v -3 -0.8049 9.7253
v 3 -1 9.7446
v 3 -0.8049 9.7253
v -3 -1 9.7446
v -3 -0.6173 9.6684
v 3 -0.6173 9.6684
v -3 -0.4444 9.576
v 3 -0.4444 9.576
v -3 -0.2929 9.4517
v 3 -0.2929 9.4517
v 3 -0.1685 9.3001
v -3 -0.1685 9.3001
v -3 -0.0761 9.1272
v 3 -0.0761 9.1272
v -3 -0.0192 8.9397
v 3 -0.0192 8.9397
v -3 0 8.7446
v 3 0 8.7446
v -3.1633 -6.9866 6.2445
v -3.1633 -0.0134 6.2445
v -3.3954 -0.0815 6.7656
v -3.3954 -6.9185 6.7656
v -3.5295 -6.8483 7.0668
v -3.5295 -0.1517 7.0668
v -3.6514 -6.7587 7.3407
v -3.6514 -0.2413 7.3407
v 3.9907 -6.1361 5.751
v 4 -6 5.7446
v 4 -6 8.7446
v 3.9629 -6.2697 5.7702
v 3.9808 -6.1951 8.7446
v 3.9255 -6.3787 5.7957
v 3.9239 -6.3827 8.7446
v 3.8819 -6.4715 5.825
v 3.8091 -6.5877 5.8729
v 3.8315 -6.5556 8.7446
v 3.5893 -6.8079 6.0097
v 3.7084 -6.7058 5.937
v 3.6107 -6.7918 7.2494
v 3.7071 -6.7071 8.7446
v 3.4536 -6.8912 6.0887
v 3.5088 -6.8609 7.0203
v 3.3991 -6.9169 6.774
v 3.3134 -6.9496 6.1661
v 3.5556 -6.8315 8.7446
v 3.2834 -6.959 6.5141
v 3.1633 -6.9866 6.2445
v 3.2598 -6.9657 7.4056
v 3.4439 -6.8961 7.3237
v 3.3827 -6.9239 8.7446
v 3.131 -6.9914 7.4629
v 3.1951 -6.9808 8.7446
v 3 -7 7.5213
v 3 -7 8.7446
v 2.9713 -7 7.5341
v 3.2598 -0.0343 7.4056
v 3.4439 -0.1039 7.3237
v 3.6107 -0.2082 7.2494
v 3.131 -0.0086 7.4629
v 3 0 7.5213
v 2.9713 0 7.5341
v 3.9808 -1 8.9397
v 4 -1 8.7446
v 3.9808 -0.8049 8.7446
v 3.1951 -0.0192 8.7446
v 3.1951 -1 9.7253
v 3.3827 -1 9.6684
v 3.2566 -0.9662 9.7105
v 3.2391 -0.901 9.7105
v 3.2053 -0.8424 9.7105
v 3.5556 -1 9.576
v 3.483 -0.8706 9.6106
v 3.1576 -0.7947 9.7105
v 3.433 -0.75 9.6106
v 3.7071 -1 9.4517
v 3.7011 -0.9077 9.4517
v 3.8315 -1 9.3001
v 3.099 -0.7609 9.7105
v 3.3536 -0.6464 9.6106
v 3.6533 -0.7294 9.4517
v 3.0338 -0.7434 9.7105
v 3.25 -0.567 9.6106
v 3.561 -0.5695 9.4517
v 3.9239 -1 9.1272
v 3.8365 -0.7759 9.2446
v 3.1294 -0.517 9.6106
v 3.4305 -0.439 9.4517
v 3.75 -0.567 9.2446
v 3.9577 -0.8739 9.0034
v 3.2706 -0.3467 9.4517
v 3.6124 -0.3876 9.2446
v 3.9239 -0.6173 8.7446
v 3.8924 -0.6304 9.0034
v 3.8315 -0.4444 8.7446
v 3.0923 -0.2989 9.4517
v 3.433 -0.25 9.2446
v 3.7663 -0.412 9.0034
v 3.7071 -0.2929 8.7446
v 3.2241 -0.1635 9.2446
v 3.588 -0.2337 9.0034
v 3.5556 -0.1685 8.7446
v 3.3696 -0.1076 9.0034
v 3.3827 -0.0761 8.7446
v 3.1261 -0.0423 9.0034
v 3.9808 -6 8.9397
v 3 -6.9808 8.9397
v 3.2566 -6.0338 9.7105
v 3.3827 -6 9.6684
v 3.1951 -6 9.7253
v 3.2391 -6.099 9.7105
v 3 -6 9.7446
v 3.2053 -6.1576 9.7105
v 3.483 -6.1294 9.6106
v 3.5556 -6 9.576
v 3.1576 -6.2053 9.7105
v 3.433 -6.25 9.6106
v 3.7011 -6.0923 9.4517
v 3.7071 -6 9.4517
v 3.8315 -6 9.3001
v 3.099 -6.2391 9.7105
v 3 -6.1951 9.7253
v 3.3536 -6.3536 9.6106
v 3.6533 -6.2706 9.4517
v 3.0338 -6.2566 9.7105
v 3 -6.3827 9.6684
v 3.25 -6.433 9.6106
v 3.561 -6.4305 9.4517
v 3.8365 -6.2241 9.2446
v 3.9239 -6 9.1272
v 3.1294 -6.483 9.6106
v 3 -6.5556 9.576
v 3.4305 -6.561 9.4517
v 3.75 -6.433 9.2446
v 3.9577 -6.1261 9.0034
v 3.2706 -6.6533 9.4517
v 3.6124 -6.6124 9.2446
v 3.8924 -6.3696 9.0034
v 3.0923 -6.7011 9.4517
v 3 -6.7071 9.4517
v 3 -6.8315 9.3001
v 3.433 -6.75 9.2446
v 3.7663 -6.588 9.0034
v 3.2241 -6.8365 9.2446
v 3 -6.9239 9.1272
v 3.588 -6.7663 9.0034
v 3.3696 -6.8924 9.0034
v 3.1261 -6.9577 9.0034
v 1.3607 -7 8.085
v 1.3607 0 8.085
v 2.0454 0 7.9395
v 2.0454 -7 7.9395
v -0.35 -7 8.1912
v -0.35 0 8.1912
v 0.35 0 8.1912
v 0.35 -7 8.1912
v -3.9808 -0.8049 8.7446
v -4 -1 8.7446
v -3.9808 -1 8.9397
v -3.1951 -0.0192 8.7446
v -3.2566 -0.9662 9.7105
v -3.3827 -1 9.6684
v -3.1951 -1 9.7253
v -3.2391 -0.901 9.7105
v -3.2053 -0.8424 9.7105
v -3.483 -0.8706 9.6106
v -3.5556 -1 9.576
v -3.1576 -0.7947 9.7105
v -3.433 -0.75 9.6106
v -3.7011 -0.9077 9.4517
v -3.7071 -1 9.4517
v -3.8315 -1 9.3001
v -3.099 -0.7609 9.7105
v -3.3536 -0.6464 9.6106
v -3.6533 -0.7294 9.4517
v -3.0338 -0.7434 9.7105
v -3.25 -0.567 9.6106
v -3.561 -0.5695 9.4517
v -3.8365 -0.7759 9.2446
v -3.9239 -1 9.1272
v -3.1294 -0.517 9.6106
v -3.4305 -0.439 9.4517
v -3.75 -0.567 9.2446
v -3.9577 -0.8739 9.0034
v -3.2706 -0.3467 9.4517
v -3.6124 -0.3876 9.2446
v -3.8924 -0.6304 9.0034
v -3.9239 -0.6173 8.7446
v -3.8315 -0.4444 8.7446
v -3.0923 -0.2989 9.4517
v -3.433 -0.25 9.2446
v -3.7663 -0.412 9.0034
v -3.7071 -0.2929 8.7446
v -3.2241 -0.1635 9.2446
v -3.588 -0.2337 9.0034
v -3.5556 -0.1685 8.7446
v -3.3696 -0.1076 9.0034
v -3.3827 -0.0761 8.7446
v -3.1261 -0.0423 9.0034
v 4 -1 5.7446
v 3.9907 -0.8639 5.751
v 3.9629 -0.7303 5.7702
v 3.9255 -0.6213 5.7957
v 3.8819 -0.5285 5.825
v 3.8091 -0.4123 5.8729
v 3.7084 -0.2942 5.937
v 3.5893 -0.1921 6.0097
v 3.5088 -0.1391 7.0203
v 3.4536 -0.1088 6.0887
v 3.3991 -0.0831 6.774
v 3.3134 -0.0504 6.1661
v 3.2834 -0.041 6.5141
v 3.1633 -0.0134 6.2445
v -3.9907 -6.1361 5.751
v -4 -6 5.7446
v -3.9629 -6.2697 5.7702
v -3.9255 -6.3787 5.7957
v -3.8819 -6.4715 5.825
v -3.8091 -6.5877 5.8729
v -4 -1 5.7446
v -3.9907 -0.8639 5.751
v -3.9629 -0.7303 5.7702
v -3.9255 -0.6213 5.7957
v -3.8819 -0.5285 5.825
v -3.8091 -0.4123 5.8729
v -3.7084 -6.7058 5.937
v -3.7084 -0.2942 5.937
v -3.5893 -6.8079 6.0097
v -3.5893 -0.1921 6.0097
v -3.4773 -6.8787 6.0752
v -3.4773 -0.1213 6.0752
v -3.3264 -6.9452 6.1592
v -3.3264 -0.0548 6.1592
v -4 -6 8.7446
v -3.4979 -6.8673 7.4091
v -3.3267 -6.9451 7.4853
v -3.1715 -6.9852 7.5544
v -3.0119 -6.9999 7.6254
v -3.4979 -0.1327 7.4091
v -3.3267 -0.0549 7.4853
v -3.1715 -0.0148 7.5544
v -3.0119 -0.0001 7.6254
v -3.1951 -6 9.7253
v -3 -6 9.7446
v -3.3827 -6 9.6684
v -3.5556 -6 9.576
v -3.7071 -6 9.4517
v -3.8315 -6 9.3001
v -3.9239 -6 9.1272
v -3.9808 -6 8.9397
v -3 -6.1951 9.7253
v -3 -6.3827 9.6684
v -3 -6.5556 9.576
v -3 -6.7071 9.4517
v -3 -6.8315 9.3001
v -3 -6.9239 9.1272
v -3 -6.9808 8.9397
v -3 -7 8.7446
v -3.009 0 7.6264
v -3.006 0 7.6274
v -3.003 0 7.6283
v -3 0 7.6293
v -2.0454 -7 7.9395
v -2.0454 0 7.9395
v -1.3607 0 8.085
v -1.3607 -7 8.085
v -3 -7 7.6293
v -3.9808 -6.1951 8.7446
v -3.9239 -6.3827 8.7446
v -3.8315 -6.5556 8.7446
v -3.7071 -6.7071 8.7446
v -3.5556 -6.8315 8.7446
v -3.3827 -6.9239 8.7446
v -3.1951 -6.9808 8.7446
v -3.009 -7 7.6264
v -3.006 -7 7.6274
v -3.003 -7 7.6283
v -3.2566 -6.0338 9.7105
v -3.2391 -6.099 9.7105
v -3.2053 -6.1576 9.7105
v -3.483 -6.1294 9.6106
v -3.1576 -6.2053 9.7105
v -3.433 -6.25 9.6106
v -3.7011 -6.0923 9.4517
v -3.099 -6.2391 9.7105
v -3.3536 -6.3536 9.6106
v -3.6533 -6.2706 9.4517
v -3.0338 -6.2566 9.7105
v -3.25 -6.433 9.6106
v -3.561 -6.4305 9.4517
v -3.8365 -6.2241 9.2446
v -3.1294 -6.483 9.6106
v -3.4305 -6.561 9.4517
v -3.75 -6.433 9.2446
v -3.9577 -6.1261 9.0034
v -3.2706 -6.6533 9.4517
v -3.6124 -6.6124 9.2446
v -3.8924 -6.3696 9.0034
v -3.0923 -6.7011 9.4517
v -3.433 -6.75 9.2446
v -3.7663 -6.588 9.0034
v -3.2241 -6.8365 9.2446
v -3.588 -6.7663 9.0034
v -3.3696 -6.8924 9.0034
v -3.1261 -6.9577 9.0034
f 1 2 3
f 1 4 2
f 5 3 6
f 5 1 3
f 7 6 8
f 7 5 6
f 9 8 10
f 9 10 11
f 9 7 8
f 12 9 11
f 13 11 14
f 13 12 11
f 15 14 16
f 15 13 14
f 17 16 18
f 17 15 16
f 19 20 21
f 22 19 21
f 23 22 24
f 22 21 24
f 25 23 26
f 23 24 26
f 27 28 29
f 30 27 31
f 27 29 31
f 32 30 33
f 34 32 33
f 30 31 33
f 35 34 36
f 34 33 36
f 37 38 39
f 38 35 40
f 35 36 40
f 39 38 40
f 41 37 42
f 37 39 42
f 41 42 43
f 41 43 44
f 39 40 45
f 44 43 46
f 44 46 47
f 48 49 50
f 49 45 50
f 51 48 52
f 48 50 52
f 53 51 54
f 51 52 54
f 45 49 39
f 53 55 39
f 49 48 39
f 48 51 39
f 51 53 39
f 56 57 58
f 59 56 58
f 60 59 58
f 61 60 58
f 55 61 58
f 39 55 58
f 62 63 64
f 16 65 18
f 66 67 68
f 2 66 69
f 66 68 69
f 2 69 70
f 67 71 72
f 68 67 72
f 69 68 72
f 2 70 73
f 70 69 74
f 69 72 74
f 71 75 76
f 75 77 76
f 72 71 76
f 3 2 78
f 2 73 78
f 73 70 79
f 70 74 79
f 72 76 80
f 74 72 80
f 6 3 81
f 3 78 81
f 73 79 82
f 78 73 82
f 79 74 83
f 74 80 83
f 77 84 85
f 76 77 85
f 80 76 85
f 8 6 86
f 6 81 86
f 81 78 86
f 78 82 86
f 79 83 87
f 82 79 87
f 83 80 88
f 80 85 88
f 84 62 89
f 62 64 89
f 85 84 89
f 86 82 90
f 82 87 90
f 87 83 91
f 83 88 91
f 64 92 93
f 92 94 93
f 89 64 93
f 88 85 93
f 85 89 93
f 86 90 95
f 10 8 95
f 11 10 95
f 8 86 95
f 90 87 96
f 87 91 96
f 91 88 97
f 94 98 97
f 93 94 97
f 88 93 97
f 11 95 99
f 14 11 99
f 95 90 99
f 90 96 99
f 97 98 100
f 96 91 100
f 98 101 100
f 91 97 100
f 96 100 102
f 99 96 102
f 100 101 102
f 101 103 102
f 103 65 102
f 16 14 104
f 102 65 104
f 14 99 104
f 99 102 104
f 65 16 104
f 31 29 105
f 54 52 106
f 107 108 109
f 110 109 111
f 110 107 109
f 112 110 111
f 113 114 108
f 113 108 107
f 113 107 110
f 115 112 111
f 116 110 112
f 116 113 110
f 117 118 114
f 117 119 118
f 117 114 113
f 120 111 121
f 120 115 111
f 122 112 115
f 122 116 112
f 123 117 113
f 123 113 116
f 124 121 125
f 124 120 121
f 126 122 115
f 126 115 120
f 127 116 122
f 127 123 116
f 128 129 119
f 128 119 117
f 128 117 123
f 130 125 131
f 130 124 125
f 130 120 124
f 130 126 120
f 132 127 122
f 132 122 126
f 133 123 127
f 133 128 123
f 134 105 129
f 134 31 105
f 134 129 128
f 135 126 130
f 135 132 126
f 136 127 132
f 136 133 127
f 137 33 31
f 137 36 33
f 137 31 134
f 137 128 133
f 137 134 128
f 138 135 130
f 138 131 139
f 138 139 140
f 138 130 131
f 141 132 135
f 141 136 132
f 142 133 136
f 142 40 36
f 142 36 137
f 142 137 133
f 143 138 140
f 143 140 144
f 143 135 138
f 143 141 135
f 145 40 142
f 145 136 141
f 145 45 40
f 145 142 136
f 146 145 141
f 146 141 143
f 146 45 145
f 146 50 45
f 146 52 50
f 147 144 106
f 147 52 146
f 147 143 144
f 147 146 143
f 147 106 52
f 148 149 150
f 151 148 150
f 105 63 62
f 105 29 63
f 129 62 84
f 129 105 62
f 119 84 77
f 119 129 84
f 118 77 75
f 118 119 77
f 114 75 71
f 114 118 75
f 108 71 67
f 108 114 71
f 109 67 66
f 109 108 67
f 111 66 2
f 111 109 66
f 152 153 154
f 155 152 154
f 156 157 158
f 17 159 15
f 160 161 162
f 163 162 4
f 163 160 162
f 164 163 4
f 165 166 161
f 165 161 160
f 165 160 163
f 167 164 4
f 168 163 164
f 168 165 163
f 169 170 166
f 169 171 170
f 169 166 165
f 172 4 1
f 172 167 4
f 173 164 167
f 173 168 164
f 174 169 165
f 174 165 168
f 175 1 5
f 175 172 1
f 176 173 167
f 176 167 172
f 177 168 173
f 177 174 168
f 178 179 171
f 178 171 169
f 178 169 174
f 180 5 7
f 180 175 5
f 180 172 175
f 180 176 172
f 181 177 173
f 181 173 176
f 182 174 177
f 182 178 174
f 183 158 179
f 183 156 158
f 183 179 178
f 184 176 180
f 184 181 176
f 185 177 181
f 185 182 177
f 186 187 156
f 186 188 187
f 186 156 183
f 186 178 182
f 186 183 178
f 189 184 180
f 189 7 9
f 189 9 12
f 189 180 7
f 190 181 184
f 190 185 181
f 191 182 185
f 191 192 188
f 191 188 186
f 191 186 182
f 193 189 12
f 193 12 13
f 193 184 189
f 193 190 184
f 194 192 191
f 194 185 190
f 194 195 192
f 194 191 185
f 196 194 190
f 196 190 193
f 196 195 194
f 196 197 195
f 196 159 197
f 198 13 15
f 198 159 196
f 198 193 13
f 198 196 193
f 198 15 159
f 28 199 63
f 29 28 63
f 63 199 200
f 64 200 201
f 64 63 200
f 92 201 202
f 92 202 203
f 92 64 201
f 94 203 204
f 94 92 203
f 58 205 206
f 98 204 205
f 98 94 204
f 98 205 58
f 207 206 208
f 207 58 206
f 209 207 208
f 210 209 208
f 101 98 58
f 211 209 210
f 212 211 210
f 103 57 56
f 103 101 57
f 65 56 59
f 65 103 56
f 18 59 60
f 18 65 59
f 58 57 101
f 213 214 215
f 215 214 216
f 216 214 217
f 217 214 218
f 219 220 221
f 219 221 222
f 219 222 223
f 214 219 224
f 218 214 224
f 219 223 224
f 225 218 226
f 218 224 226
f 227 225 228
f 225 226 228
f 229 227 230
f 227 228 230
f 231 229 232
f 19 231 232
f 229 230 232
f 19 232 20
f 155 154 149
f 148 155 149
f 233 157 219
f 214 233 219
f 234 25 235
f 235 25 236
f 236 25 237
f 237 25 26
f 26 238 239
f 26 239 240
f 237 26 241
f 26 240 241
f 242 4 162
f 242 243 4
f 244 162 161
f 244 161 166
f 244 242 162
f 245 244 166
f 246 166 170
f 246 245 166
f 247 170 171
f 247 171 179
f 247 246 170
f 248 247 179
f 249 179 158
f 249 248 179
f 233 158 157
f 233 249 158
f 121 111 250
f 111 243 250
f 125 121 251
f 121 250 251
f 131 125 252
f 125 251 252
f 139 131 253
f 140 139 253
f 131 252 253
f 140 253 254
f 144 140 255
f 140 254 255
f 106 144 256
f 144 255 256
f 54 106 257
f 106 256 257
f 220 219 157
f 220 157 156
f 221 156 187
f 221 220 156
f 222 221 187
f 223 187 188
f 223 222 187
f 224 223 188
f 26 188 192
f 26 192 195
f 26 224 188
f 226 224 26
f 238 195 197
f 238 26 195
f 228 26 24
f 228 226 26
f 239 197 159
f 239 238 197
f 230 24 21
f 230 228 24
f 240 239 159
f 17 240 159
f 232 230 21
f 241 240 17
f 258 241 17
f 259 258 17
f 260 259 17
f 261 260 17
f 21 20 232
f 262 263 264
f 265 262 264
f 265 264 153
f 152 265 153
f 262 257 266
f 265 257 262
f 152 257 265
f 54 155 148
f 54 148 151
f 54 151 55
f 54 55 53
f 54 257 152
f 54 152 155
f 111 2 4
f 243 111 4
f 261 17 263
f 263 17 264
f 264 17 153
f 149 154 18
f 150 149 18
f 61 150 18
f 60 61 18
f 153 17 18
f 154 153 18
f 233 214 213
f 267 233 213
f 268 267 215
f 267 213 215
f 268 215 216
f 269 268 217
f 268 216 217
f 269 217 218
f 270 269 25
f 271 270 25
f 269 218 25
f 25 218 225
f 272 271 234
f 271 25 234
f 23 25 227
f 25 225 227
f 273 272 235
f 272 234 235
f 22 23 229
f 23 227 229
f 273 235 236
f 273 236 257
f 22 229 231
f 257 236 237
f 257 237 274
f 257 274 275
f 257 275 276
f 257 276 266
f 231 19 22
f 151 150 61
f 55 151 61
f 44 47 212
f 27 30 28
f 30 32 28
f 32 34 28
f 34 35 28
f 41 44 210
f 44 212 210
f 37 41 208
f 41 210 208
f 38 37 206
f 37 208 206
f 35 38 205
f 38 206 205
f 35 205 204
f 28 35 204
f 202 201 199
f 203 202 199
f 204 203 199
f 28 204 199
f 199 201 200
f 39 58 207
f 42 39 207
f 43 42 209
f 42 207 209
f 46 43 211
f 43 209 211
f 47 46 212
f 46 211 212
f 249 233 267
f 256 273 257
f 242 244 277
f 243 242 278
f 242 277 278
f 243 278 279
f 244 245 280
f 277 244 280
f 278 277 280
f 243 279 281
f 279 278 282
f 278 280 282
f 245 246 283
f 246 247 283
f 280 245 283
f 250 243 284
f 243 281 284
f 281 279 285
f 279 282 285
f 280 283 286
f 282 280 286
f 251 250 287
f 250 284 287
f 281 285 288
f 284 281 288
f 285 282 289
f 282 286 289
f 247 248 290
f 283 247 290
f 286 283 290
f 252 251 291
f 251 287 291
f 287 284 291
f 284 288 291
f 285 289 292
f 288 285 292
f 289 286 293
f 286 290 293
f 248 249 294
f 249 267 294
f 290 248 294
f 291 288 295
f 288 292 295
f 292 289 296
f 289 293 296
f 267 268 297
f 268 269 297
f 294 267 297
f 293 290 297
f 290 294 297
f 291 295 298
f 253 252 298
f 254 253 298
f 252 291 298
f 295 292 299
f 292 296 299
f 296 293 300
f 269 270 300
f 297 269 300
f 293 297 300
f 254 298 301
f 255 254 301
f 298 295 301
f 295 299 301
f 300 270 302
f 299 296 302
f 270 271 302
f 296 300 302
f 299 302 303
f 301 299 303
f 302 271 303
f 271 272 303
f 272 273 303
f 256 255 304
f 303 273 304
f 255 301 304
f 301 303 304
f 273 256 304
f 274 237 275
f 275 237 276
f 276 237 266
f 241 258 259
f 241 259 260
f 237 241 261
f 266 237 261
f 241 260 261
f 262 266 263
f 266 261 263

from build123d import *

# Parameters (mm, degrees)
F1_DEPTH = 7
F2_R     = 1


with BuildPart() as f1:
    # F0 (on Front) → F1 (new body)
    with BuildSketch(Plane.XZ):
        with BuildLine():
            ThreePointArc((3.163336, 6.244462), (3.590379, 6.009091), (4, 5.744563))
            Line((4, 5.744563), (4, 9.744563))
            Line((4, 9.744563), (-4, 9.744563))
            Line((-4, 9.744563), (-4, 5.744563))
            ThreePointArc((-4, 5.744563), (-3.590379, 6.009091), (-3.163336, 6.244462))
            Line((-3.163336, 6.244462), (-3.65142, 7.340716))
            Line((-3.65142, 7.340716), (-3.011938, 7.625432))
            Line((-3.011938, 7.625432), (-2.045407, 7.939477))
            Line((-2.045407, 7.939477), (-1.360704, 8.085015))
            Line((-1.360704, 8.085015), (-0.35, 8.191245))
            Line((-0.35, 8.191245), (0.35, 8.191245))
            Line((0.35, 8.191245), (1.360704, 8.085015))
            Line((1.360704, 8.085015), (2.045407, 7.939477))
            Line((2.045407, 7.939477), (2.971265, 7.534078))
            Line((2.971265, 7.534078), (3.610747, 7.249362))
            Line((3.610747, 7.249362), (3.163336, 6.244462))
        make_face()
    extrude(amount=F1_DEPTH)

    # F2
    f2_edges = [f1.edges().sort_by_distance(p)[0] for p in [
        (-4, -7, 7.744563),
        (4, -7, 7.744563),
        (4, 0, 7.744563),
        (-4, 0, 7.744563),
        (4, -3.5, 9.744563),
        (-4, -3.5, 9.744563),
        (0, 0, 9.744563),
        (0, -7, 9.744563),
    ]]
    fillet(f2_edges, radius=F2_R)


solid = f1.part
